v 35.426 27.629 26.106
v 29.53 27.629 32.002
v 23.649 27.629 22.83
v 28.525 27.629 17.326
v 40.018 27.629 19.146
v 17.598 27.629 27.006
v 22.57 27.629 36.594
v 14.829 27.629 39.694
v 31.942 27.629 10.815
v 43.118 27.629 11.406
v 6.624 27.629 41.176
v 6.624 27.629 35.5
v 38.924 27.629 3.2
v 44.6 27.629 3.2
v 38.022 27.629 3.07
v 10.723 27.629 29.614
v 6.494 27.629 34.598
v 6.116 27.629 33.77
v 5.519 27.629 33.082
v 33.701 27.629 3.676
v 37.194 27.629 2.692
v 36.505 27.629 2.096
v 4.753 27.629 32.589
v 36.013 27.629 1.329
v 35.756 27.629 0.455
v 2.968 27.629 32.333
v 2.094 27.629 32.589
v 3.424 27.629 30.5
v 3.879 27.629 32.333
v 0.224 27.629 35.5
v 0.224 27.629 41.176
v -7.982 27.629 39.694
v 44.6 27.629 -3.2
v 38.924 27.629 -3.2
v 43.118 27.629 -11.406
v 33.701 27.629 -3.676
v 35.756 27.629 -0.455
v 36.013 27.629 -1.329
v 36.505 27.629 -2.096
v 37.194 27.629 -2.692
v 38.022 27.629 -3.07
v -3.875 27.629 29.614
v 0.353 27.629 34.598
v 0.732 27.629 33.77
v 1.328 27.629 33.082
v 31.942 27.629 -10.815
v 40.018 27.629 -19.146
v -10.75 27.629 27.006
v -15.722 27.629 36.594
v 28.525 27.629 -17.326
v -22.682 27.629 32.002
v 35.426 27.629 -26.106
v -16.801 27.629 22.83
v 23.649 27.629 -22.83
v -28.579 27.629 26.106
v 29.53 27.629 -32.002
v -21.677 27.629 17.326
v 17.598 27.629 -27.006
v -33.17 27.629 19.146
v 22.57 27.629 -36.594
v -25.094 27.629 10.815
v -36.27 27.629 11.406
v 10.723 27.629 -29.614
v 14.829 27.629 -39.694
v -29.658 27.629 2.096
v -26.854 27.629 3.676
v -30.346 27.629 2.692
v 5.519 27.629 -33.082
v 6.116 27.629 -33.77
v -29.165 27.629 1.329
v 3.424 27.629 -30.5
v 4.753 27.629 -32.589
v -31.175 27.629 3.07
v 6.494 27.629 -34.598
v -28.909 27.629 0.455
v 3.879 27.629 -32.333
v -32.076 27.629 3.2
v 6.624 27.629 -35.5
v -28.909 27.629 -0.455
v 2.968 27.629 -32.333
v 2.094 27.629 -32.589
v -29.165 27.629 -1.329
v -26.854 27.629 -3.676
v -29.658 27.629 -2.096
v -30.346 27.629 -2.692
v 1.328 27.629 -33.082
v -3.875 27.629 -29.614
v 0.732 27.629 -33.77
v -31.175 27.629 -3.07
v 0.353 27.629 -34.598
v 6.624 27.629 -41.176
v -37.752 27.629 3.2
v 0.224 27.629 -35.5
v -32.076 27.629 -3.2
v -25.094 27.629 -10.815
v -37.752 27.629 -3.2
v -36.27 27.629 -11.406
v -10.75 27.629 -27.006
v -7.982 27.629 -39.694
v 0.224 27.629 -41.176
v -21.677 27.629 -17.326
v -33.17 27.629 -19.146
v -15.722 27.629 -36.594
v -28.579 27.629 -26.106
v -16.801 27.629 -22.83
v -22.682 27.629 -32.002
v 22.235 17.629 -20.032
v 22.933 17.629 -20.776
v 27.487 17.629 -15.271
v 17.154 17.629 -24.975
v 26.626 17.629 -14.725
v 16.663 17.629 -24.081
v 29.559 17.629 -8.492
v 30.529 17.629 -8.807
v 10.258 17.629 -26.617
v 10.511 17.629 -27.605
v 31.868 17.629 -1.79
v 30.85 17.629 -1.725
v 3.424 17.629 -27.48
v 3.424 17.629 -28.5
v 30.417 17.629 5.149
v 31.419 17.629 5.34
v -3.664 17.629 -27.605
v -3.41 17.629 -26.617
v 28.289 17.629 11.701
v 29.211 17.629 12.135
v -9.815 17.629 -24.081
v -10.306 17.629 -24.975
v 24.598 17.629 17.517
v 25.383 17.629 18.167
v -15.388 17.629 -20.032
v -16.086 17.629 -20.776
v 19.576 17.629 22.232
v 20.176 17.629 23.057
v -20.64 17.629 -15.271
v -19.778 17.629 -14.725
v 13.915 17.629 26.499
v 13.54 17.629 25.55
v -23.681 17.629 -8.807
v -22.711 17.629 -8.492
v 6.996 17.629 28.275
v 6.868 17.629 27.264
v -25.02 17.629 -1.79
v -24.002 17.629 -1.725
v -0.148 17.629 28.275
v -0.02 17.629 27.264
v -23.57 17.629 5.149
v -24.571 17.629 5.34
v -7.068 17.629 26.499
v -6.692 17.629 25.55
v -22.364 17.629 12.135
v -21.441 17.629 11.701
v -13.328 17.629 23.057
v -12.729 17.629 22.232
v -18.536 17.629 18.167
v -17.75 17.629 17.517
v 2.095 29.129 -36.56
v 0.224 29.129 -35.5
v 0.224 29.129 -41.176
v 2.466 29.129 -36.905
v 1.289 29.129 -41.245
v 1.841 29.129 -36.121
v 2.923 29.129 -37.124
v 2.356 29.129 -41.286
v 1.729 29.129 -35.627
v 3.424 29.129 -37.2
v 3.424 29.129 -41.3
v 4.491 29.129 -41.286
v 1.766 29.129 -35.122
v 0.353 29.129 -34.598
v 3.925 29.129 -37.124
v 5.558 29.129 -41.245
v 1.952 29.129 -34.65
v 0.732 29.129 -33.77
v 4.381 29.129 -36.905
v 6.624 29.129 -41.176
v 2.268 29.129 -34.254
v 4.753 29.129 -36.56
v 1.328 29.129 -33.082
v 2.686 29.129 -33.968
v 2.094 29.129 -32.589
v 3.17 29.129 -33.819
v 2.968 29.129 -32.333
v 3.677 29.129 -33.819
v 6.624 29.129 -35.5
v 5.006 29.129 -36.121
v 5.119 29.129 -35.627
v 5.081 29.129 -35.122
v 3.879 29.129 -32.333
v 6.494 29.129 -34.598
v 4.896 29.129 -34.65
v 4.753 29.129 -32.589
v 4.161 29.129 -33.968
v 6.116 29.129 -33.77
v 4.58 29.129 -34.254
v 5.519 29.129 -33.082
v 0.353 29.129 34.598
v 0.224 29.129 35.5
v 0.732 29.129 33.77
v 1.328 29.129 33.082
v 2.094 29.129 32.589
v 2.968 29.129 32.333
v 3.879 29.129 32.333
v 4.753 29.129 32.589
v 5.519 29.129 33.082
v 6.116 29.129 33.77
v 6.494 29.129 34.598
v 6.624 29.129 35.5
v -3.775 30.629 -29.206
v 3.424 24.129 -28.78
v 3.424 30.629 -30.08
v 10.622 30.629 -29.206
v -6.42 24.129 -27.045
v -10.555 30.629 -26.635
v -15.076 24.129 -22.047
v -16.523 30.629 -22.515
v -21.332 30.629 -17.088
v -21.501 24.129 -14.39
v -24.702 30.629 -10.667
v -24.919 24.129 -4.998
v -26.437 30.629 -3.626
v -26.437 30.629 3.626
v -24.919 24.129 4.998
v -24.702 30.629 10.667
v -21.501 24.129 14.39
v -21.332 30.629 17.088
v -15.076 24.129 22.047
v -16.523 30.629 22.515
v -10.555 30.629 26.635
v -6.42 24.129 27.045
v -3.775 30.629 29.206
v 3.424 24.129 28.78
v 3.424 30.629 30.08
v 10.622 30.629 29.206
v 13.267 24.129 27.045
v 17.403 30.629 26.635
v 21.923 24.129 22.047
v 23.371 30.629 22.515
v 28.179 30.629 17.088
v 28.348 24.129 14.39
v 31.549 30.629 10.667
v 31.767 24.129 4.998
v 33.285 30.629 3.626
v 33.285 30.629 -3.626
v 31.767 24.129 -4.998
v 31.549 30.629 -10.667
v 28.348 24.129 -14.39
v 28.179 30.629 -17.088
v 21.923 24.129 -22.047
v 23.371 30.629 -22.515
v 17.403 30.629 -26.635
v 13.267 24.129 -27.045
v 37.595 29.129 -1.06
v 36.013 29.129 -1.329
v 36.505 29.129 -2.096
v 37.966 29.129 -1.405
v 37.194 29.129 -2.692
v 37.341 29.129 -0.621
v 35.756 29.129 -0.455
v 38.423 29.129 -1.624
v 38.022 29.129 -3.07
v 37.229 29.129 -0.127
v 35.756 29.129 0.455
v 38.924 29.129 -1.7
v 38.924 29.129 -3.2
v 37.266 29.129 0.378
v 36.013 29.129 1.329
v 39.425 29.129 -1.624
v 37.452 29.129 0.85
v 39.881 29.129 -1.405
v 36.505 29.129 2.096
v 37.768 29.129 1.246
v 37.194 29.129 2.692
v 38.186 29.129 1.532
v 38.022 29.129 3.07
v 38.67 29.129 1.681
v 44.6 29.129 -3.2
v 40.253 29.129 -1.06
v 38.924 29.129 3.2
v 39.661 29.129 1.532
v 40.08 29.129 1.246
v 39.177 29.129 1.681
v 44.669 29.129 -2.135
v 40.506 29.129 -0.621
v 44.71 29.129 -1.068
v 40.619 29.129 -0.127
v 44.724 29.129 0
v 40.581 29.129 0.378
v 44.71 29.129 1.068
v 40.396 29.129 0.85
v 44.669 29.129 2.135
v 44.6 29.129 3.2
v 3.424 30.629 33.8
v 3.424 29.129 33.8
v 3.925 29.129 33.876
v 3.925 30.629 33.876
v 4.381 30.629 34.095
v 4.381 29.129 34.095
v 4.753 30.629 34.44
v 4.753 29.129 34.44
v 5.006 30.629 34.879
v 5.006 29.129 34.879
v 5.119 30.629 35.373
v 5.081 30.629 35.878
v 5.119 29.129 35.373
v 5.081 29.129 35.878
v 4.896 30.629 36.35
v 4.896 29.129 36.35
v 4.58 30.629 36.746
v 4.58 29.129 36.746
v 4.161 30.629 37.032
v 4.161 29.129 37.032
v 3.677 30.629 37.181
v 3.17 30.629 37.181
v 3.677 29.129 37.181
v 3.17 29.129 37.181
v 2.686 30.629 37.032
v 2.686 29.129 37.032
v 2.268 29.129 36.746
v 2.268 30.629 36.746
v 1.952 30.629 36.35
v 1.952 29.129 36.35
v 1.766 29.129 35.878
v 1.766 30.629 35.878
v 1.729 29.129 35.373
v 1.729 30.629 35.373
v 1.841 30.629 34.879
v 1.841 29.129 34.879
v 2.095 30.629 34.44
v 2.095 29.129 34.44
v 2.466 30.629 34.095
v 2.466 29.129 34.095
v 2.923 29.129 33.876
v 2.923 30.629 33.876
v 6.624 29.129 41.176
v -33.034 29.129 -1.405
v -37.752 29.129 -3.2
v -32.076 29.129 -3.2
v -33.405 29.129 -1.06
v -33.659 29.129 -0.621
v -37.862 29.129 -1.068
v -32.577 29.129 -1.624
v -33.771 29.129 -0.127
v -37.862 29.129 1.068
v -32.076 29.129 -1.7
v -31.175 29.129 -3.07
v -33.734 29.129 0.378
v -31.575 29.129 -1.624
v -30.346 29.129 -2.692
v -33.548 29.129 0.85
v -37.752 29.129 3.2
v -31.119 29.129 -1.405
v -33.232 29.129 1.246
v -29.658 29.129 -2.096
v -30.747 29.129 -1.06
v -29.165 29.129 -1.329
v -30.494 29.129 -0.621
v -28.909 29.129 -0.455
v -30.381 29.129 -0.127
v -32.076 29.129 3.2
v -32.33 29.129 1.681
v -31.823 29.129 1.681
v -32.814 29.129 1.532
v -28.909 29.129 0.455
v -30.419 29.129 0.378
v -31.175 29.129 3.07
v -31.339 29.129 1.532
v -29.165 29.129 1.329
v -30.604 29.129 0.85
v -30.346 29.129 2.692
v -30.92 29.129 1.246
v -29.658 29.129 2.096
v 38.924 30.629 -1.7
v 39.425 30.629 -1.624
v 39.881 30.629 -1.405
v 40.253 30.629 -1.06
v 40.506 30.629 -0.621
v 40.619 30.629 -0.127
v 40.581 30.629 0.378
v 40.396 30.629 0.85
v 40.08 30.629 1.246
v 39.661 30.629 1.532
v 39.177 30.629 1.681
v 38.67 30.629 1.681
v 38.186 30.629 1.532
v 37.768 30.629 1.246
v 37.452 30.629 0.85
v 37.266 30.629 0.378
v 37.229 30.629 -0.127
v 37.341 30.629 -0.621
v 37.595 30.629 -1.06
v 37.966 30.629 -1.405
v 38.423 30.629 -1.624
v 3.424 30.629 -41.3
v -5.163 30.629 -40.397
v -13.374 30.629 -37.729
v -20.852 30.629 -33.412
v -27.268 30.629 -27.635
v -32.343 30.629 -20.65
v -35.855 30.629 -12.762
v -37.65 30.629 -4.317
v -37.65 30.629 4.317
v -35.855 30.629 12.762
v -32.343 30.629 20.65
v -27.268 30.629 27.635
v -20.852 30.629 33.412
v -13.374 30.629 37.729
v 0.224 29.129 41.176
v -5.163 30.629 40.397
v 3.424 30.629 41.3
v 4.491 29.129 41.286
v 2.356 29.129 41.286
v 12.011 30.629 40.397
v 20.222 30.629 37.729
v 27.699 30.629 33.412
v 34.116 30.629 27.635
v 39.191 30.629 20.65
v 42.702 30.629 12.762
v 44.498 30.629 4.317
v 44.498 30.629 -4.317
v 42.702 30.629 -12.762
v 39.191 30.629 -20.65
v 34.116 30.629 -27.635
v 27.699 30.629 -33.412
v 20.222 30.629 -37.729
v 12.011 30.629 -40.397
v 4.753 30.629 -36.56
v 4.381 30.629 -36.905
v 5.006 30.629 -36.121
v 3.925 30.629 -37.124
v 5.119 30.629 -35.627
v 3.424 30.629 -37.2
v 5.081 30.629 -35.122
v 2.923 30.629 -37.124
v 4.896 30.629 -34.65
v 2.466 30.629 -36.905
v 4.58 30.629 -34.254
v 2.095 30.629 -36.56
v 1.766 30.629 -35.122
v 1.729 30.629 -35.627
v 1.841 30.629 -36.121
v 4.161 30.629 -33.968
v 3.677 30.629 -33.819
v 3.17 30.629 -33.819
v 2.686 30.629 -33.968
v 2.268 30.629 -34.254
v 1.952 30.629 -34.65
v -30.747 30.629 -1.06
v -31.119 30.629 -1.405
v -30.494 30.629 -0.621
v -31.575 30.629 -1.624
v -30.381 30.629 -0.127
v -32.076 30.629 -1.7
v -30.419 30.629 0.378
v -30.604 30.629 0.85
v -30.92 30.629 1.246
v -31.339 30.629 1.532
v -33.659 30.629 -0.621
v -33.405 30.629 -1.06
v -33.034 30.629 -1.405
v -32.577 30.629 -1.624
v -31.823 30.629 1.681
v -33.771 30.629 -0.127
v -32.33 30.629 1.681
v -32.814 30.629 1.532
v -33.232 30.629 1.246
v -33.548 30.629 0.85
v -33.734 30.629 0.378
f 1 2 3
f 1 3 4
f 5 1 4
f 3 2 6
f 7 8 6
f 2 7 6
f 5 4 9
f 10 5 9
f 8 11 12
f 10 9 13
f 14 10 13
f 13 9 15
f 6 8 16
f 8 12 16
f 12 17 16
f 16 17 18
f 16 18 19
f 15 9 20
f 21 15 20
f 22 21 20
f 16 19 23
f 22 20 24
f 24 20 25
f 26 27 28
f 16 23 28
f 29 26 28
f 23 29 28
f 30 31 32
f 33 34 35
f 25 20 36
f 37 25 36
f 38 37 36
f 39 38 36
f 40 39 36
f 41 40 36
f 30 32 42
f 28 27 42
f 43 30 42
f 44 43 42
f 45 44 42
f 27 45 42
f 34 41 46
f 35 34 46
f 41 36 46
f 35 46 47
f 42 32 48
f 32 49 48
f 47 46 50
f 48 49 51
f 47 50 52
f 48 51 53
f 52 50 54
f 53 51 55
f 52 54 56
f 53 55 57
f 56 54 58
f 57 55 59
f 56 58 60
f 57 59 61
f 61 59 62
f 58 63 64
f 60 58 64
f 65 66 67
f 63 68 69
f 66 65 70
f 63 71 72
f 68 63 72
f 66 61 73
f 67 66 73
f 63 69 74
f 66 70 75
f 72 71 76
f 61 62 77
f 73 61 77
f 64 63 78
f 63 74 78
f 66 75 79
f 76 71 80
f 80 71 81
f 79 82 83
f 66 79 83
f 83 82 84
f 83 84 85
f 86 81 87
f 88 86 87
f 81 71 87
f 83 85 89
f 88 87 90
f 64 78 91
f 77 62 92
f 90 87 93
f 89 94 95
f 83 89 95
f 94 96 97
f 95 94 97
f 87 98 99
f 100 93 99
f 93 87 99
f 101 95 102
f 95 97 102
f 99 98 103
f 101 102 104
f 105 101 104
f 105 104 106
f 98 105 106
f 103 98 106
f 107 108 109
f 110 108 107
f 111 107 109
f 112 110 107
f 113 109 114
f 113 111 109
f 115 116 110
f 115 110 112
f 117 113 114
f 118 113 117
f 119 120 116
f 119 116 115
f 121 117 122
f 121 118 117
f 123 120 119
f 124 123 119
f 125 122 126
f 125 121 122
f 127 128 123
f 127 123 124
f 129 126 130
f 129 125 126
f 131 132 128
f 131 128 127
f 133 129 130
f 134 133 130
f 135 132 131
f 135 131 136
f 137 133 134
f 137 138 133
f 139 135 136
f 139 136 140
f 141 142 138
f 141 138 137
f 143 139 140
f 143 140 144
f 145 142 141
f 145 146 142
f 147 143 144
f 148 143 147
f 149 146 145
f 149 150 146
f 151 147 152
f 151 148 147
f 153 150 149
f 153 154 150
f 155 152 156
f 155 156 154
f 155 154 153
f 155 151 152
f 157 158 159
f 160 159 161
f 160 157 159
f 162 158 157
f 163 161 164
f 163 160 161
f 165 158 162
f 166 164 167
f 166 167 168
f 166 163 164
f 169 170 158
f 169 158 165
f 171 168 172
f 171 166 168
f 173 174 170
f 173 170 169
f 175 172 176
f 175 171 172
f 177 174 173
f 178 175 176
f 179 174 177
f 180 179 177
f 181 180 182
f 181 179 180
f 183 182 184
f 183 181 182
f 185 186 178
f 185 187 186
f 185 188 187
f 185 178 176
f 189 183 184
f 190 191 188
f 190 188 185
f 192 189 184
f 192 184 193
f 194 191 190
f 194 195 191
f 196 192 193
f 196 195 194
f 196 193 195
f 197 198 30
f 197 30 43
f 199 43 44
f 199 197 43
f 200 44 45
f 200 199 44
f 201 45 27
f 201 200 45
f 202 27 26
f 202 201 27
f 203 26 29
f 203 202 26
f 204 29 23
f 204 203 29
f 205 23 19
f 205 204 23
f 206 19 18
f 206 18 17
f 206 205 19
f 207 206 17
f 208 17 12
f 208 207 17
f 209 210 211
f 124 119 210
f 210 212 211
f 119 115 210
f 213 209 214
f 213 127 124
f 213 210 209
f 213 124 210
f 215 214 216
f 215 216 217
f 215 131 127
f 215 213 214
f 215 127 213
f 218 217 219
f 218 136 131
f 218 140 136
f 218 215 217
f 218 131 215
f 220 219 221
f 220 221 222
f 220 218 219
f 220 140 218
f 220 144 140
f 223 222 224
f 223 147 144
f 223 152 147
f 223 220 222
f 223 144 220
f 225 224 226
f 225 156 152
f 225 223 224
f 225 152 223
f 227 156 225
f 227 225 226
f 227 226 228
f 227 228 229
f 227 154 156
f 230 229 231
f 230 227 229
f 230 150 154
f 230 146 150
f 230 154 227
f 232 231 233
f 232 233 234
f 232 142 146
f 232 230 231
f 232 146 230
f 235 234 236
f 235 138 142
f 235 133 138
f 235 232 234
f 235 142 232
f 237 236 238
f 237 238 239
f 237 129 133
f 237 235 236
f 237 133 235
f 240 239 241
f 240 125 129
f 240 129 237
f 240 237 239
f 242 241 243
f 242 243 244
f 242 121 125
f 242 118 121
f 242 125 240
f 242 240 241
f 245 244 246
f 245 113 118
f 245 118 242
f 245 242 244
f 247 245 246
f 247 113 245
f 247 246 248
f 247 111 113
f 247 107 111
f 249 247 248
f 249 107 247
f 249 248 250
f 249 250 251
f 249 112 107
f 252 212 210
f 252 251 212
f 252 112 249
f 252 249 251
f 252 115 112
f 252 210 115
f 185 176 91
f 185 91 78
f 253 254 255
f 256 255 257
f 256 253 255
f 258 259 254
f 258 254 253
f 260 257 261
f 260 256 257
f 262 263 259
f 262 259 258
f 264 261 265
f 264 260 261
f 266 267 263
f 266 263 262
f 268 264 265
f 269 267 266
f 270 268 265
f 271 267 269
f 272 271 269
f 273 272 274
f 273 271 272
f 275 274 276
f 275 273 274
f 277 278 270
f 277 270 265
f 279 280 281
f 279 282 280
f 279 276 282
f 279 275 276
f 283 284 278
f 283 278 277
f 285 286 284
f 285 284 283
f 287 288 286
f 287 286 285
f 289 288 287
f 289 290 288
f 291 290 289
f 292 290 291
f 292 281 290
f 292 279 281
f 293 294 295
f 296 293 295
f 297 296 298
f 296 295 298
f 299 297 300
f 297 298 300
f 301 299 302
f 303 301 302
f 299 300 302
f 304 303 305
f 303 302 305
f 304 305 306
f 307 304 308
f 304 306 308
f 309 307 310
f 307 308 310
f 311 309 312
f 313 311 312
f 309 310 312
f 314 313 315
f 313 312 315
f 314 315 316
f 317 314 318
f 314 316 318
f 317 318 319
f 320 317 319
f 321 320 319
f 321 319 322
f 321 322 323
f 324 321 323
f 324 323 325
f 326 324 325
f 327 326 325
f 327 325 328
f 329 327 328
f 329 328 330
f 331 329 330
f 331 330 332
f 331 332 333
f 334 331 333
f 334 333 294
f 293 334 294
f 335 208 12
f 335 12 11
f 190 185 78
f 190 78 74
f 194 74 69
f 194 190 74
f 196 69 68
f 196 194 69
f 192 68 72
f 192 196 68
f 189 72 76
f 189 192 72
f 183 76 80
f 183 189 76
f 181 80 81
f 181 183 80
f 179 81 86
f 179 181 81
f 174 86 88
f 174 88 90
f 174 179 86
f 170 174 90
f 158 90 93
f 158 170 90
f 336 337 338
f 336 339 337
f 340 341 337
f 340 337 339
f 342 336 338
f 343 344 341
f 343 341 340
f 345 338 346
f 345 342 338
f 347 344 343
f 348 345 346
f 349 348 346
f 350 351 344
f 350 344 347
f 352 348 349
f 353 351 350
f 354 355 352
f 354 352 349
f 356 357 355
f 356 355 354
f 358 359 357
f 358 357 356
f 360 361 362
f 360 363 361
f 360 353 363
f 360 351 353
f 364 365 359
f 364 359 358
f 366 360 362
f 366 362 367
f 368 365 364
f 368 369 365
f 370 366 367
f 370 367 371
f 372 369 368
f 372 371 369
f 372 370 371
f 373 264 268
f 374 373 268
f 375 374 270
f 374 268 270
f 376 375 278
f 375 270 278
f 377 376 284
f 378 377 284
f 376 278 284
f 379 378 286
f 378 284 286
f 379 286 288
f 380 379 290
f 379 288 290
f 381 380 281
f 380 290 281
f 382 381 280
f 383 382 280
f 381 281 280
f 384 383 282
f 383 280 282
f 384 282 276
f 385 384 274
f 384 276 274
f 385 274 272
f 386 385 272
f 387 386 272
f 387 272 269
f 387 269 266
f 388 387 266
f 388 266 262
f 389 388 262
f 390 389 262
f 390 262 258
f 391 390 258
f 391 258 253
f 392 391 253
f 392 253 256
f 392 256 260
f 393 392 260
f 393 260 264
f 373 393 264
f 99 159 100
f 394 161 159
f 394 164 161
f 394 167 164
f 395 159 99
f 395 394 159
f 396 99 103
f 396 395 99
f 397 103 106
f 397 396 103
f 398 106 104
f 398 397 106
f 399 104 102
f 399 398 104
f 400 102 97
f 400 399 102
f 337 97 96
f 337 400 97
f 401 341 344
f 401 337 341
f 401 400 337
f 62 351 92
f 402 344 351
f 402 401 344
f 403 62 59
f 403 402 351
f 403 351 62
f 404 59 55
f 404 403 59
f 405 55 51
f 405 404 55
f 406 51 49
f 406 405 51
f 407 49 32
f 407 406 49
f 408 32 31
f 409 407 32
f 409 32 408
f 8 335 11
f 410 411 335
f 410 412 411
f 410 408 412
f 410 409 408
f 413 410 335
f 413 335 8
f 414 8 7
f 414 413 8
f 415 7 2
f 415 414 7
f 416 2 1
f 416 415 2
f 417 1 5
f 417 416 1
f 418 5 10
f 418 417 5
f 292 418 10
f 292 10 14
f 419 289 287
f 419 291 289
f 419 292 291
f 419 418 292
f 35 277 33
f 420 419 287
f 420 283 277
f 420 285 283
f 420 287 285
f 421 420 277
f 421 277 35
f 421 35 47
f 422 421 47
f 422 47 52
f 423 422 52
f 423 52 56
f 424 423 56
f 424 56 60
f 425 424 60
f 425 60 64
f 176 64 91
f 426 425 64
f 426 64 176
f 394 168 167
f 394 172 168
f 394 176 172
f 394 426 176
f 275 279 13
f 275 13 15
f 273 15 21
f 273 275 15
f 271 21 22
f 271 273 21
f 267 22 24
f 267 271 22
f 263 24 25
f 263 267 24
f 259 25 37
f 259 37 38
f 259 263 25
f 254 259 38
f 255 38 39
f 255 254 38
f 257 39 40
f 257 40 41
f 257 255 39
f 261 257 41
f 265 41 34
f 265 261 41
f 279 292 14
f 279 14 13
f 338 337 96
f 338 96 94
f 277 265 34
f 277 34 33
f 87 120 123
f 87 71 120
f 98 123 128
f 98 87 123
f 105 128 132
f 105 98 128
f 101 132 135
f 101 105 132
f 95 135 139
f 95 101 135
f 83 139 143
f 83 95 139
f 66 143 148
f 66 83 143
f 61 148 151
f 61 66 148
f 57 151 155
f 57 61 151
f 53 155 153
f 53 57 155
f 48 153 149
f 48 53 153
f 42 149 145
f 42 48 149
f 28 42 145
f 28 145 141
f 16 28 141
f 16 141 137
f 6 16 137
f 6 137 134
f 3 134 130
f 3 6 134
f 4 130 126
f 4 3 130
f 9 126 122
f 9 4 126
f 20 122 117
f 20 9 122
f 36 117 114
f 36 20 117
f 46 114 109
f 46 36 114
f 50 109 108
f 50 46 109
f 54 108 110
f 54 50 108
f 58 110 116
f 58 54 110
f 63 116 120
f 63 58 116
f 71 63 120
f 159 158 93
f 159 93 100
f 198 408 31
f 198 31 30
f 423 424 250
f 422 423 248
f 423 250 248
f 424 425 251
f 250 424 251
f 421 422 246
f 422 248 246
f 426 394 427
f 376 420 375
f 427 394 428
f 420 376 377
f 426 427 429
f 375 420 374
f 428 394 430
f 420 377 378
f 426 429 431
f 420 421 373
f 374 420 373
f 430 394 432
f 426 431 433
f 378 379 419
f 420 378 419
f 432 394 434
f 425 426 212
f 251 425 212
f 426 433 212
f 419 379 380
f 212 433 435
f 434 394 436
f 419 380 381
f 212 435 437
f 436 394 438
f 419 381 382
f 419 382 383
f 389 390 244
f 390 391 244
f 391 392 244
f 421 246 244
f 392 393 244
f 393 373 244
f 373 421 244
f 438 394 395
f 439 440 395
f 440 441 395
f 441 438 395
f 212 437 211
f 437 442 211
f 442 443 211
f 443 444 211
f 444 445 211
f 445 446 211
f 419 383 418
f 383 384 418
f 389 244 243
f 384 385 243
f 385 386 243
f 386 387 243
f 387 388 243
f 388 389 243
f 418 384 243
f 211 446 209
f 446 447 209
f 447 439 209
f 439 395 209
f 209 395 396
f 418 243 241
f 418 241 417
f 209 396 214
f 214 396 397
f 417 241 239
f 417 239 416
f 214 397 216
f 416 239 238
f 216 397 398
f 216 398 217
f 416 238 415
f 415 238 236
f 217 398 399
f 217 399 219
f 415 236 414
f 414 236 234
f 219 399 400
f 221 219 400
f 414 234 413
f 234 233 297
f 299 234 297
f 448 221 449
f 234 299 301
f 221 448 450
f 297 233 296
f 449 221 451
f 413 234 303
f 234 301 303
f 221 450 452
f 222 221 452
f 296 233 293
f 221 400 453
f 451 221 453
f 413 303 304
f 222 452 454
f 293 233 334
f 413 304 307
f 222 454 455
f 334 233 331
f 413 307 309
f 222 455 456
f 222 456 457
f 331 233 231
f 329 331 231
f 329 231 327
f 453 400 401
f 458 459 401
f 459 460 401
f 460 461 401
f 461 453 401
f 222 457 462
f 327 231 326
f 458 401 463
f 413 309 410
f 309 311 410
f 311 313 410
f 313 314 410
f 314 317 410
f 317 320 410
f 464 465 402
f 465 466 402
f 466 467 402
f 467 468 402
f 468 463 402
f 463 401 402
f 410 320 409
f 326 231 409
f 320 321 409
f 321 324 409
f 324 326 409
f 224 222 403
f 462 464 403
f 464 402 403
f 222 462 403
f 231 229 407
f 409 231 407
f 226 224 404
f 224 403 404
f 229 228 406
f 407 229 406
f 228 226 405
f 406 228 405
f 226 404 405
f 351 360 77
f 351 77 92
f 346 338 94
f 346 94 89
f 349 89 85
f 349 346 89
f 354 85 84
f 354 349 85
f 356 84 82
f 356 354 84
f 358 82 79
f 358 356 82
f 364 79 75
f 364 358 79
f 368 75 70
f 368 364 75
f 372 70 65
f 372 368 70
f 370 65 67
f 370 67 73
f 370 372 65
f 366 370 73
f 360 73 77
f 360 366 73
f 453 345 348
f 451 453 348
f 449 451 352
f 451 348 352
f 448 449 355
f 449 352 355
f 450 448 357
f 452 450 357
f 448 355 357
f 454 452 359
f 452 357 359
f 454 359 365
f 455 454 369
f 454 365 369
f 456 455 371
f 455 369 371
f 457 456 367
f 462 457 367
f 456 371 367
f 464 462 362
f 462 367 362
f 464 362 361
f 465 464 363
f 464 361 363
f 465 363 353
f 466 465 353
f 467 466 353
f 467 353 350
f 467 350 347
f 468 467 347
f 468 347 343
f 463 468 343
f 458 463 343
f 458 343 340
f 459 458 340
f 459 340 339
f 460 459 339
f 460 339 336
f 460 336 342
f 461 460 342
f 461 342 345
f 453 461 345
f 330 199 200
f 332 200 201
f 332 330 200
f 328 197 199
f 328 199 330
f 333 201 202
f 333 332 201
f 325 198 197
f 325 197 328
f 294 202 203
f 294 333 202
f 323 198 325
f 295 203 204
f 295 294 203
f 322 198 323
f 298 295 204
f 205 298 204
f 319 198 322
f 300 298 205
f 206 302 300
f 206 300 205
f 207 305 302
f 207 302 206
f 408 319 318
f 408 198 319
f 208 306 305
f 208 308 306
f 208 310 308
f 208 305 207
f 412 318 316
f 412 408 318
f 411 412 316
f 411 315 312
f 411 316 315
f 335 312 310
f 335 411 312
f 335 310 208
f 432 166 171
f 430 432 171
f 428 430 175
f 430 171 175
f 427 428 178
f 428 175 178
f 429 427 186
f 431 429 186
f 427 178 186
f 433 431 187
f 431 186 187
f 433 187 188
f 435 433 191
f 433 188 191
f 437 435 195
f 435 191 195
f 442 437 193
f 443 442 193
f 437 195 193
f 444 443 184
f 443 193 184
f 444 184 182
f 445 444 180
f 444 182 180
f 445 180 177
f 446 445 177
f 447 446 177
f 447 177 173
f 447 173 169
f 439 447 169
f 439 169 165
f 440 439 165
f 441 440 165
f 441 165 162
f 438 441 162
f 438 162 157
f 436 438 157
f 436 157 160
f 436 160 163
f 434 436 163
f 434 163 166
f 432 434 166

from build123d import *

# Parameters (mm, degrees)
SKETCH3_R          = 1.7
CUT_EXTRUDE1_DEPTH = 1.5
SKETCH3_3_R        = 1.7
CUT_EXTRUDE2_DEPTH = 62.692059893


with BuildPart() as part:
    # Sketch2 → Revolve1 (revolve)
    with BuildSketch(Plane.XY):
        Polygon((-37.876178005, 30.628606655), (-37.876178005, 27.628606655), (-27.076178005, 27.628606655), (-25.076178005, 17.628606655), (-24.056390036, 17.628606655), (-26.656390036, 30.628606655), align=None)
    revolve(axis=Axis((3.423821995, 17.628606655, 0), (0, 1, 0)))

    # Sketch3 → Cut-Extrude1 (cut)
    # profile 1 of 4: a face of its own
    with BuildSketch(Plane.XZ.offset(-27.628606655)):
        with BuildLine():
            Line((38.923821995, -3.2), (44.599664427, -3.2))
            ThreePointArc((44.599664427, -3.2), (44.723821995, 0), (44.599664427, 3.2))
            Line((44.599664427, 3.2), (38.923821995, 3.2))
            ThreePointArc((38.923821995, 3.2), (35.723821995, 0), (38.923821995, -3.2))
        make_face()
        with Locations((38.923821995, 0)):
            Circle(SKETCH3_R, mode=Mode.SUBTRACT)
    # profile 2 of 4: a face of its own
    with BuildSketch(Plane.XZ.offset(-27.628606655)):
        with BuildLine():
            ThreePointArc((0.223821995, -41.175842432), (3.423821995, -41.3), (6.623821995, -41.175842432))
            Line((6.623821995, -41.175842432), (6.623821995, -35.5))
            ThreePointArc((6.623821995, -35.5), (3.423821995, -32.3), (0.223821995, -35.5))
            Line((0.223821995, -35.5), (0.223821995, -41.175842432))
        make_face()
        with Locations((3.423821995, -35.5)):
            Circle(SKETCH3_R, mode=Mode.SUBTRACT)
    # profile 3 of 4: a face of its own
    with BuildSketch(Plane.XZ.offset(-27.628606655)):
        with BuildLine():
            ThreePointArc((-37.752020437, 3.2), (-37.876178005, 0), (-37.752020437, -3.2))
            Line((-37.752020437, -3.2), (-32.076178005, -3.2))
            ThreePointArc((-32.076178005, -3.2), (-28.876178005, 0), (-32.076178005, 3.2))
            Line((-32.076178005, 3.2), (-37.752020437, 3.2))
        make_face()
        with Locations((-32.076178005, 0)):
            Circle(SKETCH3_R, mode=Mode.SUBTRACT)
    # profile 4 of 4: a face of its own
    with BuildSketch(Plane.XZ.offset(-27.628606655)):
        with BuildLine():
            Line((6.623821995, 35.5), (6.623821995, 41.175842432))
            ThreePointArc((6.623821995, 41.175842432), (3.423821995, 41.3), (0.223821995, 41.175842432))
            Line((0.223821995, 41.175842432), (0.223821995, 35.5))
            ThreePointArc((0.223821995, 35.5), (3.423821995, 32.3), (6.623821995, 35.5))
        make_face()
        with Locations((3.423821995, 35.5)):
            Circle(SKETCH3_R, mode=Mode.SUBTRACT)
    extrude(amount=-CUT_EXTRUDE1_DEPTH, mode=Mode.SUBTRACT)

    # Sketch3<3> → Cut-Extrude2 (cut, through all)
    with BuildSketch(Plane.XZ.offset(-27.628606655)):
        with Locations((3.423821995, 35.5)):
            Circle(SKETCH3_3_R)
        with Locations((-32.076178005, 0)):
            Circle(SKETCH3_3_R)
        with Locations((3.423821995, -35.5)):
            Circle(SKETCH3_3_R)
        with Locations((38.923821995, 0)):
            Circle(SKETCH3_3_R)
    extrude(amount=-CUT_EXTRUDE2_DEPTH, mode=Mode.SUBTRACT)


solid = part.part
